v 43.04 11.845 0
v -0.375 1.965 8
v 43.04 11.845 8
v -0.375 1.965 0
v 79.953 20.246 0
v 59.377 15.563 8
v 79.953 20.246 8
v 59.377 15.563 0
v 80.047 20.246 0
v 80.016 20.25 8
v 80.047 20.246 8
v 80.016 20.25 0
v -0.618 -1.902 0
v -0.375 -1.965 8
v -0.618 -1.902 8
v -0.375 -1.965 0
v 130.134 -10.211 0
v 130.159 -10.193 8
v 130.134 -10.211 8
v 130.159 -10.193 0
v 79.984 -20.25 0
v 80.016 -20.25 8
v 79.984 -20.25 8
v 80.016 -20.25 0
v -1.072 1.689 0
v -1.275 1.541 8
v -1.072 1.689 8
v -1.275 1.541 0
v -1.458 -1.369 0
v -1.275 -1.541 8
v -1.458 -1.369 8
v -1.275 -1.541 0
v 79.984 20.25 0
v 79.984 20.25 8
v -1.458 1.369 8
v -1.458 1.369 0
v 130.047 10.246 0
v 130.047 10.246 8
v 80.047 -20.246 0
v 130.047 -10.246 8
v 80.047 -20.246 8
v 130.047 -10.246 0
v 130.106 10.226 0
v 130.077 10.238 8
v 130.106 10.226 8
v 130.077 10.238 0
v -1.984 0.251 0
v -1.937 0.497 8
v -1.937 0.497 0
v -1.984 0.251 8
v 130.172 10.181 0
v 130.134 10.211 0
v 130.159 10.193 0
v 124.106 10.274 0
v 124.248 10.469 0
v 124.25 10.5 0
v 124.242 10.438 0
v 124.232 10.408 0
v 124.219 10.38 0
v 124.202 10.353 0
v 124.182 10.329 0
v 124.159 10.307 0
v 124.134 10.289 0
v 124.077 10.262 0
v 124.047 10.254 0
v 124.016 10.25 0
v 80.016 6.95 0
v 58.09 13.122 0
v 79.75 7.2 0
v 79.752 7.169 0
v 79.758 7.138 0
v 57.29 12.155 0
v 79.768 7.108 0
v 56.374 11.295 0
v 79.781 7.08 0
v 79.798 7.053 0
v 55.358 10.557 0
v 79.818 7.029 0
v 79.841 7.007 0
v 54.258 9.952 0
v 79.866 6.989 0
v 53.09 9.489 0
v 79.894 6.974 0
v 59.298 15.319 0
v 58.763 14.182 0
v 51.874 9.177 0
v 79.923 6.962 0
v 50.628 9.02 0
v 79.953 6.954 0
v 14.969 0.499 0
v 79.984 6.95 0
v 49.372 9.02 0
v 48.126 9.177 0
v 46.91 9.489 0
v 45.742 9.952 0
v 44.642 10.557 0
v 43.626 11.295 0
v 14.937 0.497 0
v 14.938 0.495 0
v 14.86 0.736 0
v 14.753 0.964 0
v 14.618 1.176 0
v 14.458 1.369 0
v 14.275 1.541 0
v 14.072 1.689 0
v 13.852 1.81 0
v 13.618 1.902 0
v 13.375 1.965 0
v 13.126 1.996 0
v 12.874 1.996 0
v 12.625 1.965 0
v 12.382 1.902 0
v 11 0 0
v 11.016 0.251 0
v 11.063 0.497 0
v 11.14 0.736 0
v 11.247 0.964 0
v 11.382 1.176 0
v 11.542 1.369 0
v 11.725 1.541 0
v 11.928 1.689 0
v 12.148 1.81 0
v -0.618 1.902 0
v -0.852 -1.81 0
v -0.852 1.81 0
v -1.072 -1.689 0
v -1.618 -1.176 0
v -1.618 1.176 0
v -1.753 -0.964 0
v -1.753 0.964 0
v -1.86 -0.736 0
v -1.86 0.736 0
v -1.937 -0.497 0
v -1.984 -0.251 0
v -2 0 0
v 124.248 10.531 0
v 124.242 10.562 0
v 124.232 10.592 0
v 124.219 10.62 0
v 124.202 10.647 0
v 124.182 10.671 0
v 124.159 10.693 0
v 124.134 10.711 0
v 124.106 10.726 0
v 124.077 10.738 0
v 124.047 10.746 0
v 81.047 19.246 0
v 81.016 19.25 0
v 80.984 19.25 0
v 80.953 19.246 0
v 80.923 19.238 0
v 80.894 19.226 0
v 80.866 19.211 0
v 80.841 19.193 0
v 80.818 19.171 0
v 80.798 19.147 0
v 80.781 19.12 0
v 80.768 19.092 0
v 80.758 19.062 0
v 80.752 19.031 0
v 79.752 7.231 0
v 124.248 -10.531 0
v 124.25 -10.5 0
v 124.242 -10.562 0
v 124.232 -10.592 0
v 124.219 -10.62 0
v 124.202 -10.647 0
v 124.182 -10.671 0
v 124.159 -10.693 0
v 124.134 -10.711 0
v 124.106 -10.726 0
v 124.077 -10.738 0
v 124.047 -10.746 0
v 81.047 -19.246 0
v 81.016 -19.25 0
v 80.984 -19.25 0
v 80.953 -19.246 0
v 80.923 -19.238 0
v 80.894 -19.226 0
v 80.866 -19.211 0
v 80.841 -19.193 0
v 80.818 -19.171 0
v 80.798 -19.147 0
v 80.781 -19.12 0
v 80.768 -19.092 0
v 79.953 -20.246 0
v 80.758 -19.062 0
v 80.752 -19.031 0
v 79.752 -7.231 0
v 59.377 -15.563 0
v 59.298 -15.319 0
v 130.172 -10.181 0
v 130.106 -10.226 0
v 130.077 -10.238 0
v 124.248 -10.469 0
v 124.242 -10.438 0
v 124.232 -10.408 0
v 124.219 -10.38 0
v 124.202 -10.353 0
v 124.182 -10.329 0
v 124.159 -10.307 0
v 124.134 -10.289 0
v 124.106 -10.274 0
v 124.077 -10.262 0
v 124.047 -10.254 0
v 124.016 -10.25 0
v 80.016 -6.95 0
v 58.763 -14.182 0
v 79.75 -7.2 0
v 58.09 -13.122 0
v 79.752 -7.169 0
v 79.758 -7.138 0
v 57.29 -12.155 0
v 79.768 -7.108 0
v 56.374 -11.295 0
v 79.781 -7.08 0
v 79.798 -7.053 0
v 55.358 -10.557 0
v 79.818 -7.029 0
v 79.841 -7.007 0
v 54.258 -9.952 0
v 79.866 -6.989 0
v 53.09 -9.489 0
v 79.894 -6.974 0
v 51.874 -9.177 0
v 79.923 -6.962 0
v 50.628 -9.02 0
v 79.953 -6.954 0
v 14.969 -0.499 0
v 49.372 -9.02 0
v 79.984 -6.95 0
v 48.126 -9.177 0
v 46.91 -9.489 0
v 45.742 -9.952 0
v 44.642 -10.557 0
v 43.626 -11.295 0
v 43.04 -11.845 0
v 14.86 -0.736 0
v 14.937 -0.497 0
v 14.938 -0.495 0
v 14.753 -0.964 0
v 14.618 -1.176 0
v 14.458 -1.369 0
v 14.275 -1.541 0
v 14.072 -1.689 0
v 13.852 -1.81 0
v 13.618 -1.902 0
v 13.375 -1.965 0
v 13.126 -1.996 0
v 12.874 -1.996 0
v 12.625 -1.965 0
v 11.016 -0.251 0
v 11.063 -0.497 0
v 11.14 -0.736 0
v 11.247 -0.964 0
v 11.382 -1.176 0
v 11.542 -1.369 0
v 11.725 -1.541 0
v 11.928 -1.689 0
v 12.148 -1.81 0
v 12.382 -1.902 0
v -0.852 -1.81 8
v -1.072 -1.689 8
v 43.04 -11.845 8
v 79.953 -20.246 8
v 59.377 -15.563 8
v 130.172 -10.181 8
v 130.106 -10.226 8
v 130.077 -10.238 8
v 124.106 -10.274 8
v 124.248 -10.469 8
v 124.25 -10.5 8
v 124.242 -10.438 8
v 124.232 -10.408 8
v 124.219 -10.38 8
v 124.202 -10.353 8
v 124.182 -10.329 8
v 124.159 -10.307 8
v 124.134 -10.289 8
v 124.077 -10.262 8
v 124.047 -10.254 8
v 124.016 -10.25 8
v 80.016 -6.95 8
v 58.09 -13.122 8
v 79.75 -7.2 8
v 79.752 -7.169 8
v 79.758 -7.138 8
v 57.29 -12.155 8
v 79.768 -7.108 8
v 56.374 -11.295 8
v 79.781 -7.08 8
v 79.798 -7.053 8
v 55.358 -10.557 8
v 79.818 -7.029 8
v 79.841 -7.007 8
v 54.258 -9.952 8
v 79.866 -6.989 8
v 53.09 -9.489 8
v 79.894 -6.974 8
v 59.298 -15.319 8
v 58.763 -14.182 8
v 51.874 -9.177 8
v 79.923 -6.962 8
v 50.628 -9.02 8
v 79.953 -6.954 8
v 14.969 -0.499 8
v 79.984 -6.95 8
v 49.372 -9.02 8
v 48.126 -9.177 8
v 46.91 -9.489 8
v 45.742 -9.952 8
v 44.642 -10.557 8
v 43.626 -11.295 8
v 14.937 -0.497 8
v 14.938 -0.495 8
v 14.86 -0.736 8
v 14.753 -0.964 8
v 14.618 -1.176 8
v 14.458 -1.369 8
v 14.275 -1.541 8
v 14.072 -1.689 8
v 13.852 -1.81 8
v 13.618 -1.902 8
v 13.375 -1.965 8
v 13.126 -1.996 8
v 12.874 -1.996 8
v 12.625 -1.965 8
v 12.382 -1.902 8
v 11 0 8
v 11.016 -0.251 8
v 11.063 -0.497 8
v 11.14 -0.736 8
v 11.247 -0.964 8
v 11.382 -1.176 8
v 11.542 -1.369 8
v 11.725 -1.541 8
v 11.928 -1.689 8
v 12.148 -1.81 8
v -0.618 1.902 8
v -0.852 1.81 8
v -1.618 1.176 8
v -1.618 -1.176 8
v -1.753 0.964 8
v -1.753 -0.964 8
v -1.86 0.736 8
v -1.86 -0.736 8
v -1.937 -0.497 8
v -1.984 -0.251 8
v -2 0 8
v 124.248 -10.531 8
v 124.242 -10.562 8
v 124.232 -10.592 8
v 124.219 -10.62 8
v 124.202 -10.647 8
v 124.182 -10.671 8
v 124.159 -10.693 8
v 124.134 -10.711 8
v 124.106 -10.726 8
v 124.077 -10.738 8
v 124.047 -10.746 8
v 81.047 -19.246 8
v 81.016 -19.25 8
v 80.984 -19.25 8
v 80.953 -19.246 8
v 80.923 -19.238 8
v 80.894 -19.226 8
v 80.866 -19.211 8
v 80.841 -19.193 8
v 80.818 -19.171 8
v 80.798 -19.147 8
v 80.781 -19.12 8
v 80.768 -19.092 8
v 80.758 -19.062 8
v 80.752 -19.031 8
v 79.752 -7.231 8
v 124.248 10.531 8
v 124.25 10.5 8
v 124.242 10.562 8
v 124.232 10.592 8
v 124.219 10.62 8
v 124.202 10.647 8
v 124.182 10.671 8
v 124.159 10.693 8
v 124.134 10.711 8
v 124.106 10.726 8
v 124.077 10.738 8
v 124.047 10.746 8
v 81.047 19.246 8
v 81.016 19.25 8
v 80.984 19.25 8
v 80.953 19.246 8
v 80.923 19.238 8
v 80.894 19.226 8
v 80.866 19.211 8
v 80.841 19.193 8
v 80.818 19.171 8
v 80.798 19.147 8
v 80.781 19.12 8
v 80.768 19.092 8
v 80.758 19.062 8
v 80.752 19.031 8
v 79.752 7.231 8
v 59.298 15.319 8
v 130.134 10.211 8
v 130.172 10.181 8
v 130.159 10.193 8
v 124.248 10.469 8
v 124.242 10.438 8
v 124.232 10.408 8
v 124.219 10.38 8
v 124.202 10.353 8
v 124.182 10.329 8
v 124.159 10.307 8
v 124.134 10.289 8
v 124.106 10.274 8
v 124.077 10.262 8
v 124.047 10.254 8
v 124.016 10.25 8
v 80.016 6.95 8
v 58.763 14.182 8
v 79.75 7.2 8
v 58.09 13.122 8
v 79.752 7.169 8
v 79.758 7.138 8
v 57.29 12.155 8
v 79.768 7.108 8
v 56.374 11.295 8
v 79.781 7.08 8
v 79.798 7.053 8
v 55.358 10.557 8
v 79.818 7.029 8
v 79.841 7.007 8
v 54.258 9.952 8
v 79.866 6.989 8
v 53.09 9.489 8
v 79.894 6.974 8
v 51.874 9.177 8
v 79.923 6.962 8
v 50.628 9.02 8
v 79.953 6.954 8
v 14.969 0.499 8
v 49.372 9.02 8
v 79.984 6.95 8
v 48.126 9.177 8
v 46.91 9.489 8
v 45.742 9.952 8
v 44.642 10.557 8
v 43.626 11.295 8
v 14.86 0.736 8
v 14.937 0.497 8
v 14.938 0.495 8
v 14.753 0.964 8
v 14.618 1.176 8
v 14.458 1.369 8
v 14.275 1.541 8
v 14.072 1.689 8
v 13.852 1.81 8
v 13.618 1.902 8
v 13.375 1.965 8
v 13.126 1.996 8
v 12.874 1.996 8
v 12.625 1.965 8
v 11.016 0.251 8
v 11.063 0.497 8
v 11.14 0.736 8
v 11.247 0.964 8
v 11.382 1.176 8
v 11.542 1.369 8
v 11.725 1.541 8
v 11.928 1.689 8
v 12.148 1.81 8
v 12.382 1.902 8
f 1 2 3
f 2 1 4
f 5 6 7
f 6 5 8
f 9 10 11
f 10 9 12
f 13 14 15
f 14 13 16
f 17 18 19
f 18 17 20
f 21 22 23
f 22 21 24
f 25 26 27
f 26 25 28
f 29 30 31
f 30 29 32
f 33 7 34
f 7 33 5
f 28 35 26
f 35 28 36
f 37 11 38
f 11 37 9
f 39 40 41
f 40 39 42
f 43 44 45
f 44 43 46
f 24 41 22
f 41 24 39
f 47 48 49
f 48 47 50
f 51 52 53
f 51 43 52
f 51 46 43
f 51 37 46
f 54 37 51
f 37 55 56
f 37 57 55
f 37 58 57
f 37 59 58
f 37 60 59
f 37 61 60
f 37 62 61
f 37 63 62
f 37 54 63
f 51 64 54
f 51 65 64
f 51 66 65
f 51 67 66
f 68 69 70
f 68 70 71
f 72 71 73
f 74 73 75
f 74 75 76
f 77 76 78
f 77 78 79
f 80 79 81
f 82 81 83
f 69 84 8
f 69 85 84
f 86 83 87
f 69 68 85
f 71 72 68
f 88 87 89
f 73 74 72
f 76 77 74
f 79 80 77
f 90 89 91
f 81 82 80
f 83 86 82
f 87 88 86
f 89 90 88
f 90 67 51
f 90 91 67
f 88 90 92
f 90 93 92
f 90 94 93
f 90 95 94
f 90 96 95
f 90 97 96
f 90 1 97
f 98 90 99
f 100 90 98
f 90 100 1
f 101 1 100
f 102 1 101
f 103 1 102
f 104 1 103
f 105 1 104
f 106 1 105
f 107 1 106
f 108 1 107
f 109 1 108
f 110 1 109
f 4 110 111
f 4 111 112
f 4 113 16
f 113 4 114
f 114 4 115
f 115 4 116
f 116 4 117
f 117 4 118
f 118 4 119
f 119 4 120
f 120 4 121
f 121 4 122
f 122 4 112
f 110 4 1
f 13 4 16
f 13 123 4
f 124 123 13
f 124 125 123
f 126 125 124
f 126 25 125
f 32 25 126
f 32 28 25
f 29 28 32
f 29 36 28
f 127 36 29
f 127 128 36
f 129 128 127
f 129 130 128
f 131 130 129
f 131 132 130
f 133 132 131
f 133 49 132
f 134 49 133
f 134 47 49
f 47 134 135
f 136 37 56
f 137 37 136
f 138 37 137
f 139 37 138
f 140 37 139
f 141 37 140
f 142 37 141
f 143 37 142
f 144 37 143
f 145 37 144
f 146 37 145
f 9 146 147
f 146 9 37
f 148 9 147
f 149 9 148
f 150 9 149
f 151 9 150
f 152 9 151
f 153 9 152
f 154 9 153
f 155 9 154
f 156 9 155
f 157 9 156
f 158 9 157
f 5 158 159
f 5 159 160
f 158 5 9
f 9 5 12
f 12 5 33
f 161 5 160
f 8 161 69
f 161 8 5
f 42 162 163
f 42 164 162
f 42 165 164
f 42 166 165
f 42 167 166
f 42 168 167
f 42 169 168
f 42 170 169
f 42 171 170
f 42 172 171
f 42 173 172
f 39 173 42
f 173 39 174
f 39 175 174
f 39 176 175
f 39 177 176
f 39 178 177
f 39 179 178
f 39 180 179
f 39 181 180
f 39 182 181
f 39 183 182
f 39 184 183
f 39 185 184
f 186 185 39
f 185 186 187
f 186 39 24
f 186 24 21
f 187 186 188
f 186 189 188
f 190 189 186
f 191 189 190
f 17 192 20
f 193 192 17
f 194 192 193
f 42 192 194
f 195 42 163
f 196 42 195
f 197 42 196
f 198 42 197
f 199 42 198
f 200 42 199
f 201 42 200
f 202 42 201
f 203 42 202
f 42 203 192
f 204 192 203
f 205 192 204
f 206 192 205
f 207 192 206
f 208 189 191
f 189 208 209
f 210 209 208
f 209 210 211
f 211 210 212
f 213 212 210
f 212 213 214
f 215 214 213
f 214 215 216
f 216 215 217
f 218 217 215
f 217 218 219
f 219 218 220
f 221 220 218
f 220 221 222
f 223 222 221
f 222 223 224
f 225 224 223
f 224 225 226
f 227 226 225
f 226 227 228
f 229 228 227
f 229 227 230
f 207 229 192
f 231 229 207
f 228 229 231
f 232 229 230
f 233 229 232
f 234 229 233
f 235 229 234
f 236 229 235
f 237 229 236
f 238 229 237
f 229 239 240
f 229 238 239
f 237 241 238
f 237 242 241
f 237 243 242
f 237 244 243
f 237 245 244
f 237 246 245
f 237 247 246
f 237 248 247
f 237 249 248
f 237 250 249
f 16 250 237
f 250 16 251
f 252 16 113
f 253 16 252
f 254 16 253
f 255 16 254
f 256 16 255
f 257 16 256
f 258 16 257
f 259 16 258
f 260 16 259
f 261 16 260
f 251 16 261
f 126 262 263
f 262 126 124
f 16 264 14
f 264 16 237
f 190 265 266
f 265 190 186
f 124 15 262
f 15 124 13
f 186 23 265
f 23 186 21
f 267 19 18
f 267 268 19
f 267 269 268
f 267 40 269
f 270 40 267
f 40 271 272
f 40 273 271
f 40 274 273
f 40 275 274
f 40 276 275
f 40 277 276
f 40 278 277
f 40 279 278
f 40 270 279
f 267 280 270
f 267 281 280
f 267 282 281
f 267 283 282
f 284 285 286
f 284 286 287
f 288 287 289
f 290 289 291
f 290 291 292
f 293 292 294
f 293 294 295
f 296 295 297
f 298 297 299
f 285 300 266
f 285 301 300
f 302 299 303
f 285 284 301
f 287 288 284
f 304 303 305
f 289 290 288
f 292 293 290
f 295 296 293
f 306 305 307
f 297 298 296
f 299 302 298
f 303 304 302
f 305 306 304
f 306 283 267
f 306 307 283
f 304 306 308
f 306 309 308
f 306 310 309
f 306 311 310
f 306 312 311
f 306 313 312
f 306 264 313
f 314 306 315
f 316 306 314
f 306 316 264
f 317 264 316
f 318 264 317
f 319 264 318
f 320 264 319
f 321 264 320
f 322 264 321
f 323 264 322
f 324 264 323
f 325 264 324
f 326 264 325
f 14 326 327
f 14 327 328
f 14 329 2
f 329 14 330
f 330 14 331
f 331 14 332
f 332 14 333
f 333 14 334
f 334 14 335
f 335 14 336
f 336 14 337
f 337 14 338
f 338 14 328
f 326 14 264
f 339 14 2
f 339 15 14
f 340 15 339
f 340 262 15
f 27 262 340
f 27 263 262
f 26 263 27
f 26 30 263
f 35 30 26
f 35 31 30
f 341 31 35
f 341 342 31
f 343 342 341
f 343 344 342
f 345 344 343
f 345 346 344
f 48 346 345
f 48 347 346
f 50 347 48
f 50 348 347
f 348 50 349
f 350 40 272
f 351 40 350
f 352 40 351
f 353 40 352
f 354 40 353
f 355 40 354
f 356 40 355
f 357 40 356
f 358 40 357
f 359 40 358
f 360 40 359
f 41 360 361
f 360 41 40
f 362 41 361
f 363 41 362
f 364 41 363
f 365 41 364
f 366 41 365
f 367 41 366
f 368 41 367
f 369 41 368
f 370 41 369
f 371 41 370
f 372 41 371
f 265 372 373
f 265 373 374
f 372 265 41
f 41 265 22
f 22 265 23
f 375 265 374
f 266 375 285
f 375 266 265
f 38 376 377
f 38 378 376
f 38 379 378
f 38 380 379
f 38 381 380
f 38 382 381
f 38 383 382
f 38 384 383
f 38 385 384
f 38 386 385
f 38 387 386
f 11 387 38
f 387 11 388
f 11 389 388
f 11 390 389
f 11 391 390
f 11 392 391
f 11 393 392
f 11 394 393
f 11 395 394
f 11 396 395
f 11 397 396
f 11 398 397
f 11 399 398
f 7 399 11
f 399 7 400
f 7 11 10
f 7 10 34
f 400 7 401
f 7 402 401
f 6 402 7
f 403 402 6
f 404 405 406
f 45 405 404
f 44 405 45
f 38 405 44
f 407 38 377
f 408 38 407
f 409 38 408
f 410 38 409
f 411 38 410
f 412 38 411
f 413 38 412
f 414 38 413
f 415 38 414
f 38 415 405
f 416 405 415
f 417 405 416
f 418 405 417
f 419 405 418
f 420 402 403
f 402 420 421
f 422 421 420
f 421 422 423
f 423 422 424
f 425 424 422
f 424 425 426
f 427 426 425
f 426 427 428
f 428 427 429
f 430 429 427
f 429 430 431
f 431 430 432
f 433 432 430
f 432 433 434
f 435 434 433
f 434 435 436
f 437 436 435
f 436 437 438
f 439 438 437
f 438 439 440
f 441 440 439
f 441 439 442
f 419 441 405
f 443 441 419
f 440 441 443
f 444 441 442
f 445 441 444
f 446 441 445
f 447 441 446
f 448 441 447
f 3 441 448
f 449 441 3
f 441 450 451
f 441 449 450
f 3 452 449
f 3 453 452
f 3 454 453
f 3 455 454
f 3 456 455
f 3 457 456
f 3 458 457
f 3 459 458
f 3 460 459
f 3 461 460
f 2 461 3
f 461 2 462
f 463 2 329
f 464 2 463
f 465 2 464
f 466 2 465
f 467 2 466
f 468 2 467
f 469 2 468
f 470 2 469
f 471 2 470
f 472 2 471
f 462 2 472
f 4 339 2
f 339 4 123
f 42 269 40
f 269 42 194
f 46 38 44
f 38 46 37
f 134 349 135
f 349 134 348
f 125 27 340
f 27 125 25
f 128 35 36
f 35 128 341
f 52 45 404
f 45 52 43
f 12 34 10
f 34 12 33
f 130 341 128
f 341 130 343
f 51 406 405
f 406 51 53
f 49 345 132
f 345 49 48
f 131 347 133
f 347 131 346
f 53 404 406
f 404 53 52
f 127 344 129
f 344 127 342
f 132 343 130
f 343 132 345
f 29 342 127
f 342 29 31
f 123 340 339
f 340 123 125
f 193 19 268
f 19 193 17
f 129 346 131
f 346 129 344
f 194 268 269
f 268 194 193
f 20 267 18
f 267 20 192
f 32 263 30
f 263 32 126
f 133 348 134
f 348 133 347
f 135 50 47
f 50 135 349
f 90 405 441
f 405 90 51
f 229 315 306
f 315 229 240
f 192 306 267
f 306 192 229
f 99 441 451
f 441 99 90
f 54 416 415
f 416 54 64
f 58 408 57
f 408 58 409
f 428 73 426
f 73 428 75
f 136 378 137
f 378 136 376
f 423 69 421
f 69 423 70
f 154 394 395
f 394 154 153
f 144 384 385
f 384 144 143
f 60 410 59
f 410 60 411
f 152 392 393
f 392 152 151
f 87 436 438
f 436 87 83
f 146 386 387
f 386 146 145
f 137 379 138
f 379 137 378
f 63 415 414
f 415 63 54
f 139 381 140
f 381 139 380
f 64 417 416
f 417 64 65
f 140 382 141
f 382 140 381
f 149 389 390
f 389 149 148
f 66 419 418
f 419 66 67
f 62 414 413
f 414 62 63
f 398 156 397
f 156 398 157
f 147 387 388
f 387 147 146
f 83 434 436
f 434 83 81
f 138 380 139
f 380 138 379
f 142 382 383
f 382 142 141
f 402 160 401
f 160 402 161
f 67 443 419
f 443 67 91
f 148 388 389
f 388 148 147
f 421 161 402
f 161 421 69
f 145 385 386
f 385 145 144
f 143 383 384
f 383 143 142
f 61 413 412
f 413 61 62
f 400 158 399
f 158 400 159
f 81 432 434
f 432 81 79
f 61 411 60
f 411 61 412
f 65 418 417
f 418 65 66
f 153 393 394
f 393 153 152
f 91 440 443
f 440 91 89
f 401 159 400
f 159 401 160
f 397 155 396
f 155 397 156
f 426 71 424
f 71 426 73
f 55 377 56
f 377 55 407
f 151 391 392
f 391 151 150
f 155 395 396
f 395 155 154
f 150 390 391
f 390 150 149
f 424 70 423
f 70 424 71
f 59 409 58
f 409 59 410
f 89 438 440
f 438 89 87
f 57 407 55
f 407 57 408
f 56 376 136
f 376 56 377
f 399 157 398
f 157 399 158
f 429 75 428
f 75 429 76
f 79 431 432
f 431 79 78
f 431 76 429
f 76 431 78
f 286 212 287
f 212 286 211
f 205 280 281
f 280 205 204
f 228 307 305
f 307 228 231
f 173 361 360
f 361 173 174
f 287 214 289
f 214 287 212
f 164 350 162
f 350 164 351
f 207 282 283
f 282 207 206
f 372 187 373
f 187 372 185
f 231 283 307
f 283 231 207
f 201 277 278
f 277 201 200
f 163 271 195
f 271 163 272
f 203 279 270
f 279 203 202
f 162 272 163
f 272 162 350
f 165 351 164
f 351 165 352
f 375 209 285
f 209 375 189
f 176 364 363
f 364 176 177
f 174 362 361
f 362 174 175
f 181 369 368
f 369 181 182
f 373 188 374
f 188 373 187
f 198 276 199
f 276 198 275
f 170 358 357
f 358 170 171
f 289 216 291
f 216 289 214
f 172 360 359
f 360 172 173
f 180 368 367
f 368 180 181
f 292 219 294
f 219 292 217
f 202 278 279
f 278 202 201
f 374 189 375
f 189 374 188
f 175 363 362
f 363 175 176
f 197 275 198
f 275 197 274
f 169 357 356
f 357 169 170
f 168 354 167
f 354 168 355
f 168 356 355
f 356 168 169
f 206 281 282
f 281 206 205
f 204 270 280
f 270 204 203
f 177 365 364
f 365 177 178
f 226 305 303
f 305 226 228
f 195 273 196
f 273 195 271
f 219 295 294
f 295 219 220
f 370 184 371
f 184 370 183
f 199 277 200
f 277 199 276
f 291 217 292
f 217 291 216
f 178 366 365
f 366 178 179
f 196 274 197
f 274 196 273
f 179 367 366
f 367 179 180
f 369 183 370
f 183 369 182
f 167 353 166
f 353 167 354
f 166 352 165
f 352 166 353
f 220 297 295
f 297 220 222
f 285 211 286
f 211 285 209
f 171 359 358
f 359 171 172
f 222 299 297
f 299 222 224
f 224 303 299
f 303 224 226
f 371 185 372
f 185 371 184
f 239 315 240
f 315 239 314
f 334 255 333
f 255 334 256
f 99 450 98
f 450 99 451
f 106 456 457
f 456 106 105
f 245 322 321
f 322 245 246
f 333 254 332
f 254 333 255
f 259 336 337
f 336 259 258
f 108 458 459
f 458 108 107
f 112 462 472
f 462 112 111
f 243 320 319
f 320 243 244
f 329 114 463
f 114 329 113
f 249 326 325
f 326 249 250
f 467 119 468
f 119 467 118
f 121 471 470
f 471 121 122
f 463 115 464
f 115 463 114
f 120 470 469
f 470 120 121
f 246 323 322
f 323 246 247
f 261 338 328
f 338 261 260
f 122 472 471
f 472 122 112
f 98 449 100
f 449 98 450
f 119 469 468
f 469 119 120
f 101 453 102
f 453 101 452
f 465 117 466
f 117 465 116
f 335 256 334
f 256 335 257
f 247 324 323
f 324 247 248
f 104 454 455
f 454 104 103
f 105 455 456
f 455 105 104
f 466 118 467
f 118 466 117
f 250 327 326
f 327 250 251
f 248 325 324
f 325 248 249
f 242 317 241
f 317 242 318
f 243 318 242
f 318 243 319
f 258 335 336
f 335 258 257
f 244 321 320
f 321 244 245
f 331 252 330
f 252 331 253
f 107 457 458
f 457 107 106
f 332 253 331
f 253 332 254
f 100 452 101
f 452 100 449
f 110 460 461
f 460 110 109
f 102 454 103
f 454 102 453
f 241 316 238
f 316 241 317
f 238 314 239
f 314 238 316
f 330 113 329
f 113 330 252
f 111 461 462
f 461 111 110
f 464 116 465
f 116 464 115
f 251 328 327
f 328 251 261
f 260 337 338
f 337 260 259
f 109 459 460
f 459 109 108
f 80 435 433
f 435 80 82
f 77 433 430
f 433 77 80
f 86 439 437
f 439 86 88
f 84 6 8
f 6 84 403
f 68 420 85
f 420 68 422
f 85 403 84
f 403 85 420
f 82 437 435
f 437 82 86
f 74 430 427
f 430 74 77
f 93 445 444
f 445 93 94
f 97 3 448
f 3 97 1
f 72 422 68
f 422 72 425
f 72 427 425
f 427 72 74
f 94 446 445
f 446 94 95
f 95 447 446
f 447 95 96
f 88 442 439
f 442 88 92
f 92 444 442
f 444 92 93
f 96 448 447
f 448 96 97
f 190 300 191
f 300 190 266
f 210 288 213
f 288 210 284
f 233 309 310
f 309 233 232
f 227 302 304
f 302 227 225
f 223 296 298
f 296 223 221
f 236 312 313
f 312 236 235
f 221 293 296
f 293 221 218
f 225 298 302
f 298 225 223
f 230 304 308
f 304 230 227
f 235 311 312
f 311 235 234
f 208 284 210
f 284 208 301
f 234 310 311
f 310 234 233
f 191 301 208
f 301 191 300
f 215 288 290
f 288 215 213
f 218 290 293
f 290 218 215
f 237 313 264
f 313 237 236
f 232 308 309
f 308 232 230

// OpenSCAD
$fn=50;
height = 8;
CRadius =0.25;


// translate([x,y,z]) cylinder(h = height, r1 = CRadius, r2 = CRadius, center = true/false);
difference(){

union(){
difference(){
hull(){
translate([0,0,0]) cylinder(h = height, r1 = 2, r2 = 2, center = true/false);
translate([130,10,0]) cylinder(h = height, r1 = CRadius, r2 = CRadius, center = true/false);
translate([80,20,0]) cylinder(h = height, r1 = CRadius, r2 = CRadius, center = true/false);
translate([130,-10,0]) cylinder(h = height, r1 = CRadius, r2 = CRadius, center = true/false);
translate([80,-20,0]) cylinder(h = height, r1 = CRadius, r2 = CRadius, center = true/false);
}
hull(){
translate([15,0,-0.5]) cylinder(h = height+1, r1 = .5, r2 = .5, center = true/false);

translate([131,10,-0.5]) cylinder(h = height+1, r1 = CRadius, r2 = CRadius, center = true/false);

translate([131,-10,-0.5]) cylinder(h = height+1, r1 = CRadius, r2 = CRadius, center = true/false);
}
}}

union(){
    hull(){
    translate([124,10.5,-0.5]) cylinder(h = height+1, r1 = CRadius, r2 = CRadius, center = true/false);

    translate([80,7.2,-0.5]) cylinder(h = height+1, r1 = CRadius, r2 = CRadius, center = true/false);

    translate([81,19,-0.5]) cylinder(h = height+1, r1 = CRadius, r2 = CRadius, center = true/false);
    }
    hull(){
    translate([124,-10.5,-0.5]) cylinder(h = height+1, r1 = CRadius, r2 = CRadius, center = true/false);

    translate([80,-7.2,-0.5]) cylinder(h = height+1, r1 = CRadius, r2 = CRadius, center = true/false);

    translate([81,-19,-0.5]) cylinder(h = height+1, r1 = CRadius, r2 = CRadius, center = true/false);
    }
    translate([13,0,-0.5]) cylinder(h = height+1, r1 = 2, r2 = 2, center = true/false);
 // Griffmulden
    translate([50,19,-0.5]) cylinder(h = height+12, r1 = 10, r2 = 10, center = true/false);
    translate([50,-19,-0.5]) cylinder(h = height+12, r1 = 10, r2 = 10, center = true/false);  

}
}
